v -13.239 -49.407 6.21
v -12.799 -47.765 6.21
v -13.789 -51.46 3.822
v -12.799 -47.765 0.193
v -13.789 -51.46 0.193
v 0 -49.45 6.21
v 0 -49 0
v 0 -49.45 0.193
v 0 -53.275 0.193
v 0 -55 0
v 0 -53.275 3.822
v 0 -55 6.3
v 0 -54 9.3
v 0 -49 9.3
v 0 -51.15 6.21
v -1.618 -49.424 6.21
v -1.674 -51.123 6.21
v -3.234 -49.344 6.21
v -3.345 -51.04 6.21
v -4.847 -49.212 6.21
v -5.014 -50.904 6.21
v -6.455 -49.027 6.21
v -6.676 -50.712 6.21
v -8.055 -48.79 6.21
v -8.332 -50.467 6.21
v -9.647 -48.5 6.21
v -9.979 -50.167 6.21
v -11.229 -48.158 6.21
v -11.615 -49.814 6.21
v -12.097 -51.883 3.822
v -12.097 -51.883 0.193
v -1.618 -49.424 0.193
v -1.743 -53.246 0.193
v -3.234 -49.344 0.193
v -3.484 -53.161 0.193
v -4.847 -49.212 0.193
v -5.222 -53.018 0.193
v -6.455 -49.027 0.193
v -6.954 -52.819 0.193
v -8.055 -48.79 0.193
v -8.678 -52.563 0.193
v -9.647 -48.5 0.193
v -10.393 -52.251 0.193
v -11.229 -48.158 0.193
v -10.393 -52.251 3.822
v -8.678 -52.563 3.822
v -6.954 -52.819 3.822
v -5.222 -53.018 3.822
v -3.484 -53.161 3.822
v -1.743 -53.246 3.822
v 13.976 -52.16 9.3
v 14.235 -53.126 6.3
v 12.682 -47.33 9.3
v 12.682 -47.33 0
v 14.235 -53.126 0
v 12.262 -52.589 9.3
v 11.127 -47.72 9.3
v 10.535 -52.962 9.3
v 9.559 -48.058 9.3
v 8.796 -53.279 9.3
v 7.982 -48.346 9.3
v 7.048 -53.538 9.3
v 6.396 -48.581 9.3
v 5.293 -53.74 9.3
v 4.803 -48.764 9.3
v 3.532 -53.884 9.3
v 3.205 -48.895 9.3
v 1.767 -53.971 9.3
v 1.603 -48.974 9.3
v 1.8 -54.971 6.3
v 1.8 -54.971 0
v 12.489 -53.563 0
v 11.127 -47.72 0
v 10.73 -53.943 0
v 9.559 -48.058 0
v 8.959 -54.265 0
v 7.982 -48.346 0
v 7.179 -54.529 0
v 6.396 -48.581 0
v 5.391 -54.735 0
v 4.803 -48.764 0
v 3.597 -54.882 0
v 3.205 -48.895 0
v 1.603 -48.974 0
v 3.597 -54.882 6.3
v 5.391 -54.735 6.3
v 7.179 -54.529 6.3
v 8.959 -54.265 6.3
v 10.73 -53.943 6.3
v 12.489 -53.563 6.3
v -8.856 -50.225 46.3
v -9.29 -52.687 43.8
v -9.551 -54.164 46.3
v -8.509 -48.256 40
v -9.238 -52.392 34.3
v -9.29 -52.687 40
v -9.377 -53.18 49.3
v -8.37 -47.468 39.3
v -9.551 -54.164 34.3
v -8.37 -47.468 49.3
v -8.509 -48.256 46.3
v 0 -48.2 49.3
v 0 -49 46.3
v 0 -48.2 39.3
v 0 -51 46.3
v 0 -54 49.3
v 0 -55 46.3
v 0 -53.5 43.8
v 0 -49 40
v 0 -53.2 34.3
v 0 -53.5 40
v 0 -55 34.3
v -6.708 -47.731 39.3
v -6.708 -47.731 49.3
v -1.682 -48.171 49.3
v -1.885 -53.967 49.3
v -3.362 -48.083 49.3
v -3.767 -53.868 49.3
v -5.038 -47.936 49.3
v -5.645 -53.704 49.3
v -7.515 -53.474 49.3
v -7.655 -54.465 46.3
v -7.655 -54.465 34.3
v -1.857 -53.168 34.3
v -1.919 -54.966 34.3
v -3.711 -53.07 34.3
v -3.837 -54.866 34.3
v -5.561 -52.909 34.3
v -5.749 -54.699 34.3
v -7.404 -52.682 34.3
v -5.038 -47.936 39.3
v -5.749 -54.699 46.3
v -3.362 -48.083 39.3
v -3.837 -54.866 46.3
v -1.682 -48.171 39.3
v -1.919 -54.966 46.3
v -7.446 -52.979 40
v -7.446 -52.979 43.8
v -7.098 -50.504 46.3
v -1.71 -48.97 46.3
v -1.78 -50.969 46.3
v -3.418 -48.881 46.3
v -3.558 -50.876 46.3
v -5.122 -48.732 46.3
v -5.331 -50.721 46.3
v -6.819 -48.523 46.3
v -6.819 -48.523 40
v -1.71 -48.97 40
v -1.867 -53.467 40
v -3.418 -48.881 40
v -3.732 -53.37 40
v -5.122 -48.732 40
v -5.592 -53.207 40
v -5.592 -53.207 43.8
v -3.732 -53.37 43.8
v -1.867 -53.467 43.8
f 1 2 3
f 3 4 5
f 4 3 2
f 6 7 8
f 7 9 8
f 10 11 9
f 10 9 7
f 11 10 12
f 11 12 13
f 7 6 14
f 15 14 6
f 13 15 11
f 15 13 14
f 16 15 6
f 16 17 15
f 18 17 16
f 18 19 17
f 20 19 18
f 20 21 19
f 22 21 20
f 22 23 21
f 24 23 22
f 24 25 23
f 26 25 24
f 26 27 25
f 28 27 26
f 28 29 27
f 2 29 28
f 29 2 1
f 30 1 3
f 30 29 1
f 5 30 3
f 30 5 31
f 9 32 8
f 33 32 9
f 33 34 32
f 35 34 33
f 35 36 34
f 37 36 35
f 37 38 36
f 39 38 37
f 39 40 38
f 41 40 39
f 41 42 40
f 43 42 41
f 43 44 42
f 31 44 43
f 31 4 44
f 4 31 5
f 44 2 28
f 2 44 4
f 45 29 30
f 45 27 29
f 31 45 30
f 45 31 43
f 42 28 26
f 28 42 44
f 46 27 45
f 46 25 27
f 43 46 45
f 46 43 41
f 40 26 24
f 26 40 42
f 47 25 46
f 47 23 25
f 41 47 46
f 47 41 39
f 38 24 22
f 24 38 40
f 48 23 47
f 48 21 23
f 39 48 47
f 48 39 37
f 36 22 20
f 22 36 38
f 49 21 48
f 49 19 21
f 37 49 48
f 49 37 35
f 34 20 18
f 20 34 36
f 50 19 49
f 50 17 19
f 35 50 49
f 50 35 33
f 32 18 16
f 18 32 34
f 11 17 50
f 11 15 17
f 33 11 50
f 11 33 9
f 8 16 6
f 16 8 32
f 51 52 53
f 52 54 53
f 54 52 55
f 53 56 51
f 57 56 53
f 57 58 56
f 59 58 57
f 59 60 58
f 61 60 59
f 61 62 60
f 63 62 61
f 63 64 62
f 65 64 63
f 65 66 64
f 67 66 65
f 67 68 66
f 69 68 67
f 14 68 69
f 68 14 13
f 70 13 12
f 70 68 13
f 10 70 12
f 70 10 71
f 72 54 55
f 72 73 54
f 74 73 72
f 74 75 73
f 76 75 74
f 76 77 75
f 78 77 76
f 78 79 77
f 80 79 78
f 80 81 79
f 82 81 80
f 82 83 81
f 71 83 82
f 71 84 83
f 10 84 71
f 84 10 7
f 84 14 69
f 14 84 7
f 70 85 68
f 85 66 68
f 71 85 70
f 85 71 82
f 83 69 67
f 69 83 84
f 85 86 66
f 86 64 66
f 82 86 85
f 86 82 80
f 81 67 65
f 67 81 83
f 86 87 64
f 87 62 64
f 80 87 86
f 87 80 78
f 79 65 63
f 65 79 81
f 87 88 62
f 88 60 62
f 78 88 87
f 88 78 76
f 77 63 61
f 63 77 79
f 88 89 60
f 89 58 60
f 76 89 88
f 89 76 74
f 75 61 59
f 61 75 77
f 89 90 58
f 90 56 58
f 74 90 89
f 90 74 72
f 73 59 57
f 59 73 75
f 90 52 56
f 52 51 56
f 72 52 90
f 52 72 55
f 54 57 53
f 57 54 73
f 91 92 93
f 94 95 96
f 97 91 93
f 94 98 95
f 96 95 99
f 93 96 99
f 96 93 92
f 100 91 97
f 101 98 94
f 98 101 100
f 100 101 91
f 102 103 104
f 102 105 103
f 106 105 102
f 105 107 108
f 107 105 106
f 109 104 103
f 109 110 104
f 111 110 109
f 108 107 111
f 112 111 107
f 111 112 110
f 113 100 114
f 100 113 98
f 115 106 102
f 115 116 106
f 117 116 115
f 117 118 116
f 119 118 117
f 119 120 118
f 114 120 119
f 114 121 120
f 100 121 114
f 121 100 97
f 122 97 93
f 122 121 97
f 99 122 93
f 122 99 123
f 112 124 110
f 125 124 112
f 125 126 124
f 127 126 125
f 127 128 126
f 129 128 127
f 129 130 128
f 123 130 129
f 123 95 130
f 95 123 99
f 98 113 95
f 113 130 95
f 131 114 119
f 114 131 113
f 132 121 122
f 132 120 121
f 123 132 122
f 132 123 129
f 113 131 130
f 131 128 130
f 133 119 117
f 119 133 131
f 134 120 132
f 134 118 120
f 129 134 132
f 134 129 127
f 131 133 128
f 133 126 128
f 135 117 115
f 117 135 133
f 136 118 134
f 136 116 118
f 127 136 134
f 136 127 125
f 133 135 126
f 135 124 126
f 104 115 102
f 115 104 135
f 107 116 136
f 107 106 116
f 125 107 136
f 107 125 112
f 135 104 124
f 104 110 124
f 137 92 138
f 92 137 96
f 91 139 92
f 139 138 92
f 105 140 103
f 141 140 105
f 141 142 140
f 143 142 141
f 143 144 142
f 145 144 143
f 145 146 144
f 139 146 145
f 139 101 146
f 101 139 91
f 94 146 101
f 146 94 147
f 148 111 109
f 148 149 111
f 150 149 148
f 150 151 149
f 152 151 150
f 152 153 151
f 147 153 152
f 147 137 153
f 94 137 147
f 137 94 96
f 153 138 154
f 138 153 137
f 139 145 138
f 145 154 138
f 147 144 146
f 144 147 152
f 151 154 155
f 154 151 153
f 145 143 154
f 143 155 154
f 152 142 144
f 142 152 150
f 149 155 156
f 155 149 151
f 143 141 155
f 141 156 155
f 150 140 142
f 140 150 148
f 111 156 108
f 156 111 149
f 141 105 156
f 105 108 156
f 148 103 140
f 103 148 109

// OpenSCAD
// create main enclosure
module shell(diameter, height, wall_thickness, base) {
	translate([0, 0, height/2])
		difference() {
			cylinder(h = height, d = diameter, center = true);
				if (base) // remove core, keep bottom
					translate([0,0,wall_thickness])
						cylinder(h = height, d = diameter-wall_thickness*2, center = true);
				else // remove core, no bottom
					cylinder(h = height+1, d = diameter-wall_thickness*2, center = true);
		}
}

// connectors to receive another module on top
// these are placed 10deg off-center -> counterparts should be placed -10deg off center
module connectors_female(angle, base_radius, height, wall_thickness) {
	width = 10; // in degrees
	rotate([0,0,angle-width])
		rotate_extrude(angle = width, $fn = 200)
			translate([-base_radius + wall_thickness, height-5.7]) //0.3 to center scaled male pin
				polygon(
					points = [[0,0],[0,12],[1,15],[6.8,15],[6.8,5],[1.8,0], [1.5,5.7],[1.5,5.7+3.8],[1.5+2.5,5.7+6.3],[1.5+4.5,5.7+6.3],[1.5+4.5,5.7]],
					paths = [[0,1,2,3,4,5], [6,7,8,9,10,11]]
				);
}

// connectors to connect to another module below
module connectors_male(angle, base_radius, wall_thickness) {
	width = 15; // in degrees
	//pin
	rotate([0,0,angle-width])
		rotate_extrude(angle = width, $fn = 200)
			translate([-base_radius + wall_thickness, -5.7 + 0.45])
				translate([0.45,0]) // counteract the non-centered scale (but leave flat on build plate)
					scale([0.85,0.955]) // scale to leave room for easier connection (10%=[0.9,0.9])
						polygon(
							points = [[1.5,5.7],[1.5,9.5],[4,12],[6,12],[6,5.7]],
							paths = [[0,1,2,3,4,5]]
						);

	// pin-base
	rotate([0,0,angle])
		rotate_extrude(angle = width, $fn = 200)
			translate([-base_radius + wall_thickness, -5.7])
				polygon(
					points = [[0,5.7],[0,12],[1,15],[6,15],[6,5.7],[1.8,5.7]],
					paths = [[0,1,2,3,4,5]]
				);
}

// adds a sensor enclosure to the module
// parameters are length/width of enclosure
module enclosure(angle, length, width, base_radius, base_height, wall_thickness, port_radius) {
	difference() {
		translate([base_radius-length-wall_thickness,-width/2,0])
			difference() {
				cube([length, width, base_height], false);
				translate([wall_thickness,wall_thickness,wall_thickness])
					cube([length-wall_thickness*2, width-wall_thickness*2, base_height-wall_thickness+1], false);
			}
		translate([base_radius-length-wall_thickness-1, 0, base_height/2+wall_thickness/2])
			rotate([0,90,0])
			cylinder(wall_thickness+2, r = port_radius);
	}
};


// example renders
connectors_female(90, 60, 40, 5);
connectors_male(90, 60, 5);
